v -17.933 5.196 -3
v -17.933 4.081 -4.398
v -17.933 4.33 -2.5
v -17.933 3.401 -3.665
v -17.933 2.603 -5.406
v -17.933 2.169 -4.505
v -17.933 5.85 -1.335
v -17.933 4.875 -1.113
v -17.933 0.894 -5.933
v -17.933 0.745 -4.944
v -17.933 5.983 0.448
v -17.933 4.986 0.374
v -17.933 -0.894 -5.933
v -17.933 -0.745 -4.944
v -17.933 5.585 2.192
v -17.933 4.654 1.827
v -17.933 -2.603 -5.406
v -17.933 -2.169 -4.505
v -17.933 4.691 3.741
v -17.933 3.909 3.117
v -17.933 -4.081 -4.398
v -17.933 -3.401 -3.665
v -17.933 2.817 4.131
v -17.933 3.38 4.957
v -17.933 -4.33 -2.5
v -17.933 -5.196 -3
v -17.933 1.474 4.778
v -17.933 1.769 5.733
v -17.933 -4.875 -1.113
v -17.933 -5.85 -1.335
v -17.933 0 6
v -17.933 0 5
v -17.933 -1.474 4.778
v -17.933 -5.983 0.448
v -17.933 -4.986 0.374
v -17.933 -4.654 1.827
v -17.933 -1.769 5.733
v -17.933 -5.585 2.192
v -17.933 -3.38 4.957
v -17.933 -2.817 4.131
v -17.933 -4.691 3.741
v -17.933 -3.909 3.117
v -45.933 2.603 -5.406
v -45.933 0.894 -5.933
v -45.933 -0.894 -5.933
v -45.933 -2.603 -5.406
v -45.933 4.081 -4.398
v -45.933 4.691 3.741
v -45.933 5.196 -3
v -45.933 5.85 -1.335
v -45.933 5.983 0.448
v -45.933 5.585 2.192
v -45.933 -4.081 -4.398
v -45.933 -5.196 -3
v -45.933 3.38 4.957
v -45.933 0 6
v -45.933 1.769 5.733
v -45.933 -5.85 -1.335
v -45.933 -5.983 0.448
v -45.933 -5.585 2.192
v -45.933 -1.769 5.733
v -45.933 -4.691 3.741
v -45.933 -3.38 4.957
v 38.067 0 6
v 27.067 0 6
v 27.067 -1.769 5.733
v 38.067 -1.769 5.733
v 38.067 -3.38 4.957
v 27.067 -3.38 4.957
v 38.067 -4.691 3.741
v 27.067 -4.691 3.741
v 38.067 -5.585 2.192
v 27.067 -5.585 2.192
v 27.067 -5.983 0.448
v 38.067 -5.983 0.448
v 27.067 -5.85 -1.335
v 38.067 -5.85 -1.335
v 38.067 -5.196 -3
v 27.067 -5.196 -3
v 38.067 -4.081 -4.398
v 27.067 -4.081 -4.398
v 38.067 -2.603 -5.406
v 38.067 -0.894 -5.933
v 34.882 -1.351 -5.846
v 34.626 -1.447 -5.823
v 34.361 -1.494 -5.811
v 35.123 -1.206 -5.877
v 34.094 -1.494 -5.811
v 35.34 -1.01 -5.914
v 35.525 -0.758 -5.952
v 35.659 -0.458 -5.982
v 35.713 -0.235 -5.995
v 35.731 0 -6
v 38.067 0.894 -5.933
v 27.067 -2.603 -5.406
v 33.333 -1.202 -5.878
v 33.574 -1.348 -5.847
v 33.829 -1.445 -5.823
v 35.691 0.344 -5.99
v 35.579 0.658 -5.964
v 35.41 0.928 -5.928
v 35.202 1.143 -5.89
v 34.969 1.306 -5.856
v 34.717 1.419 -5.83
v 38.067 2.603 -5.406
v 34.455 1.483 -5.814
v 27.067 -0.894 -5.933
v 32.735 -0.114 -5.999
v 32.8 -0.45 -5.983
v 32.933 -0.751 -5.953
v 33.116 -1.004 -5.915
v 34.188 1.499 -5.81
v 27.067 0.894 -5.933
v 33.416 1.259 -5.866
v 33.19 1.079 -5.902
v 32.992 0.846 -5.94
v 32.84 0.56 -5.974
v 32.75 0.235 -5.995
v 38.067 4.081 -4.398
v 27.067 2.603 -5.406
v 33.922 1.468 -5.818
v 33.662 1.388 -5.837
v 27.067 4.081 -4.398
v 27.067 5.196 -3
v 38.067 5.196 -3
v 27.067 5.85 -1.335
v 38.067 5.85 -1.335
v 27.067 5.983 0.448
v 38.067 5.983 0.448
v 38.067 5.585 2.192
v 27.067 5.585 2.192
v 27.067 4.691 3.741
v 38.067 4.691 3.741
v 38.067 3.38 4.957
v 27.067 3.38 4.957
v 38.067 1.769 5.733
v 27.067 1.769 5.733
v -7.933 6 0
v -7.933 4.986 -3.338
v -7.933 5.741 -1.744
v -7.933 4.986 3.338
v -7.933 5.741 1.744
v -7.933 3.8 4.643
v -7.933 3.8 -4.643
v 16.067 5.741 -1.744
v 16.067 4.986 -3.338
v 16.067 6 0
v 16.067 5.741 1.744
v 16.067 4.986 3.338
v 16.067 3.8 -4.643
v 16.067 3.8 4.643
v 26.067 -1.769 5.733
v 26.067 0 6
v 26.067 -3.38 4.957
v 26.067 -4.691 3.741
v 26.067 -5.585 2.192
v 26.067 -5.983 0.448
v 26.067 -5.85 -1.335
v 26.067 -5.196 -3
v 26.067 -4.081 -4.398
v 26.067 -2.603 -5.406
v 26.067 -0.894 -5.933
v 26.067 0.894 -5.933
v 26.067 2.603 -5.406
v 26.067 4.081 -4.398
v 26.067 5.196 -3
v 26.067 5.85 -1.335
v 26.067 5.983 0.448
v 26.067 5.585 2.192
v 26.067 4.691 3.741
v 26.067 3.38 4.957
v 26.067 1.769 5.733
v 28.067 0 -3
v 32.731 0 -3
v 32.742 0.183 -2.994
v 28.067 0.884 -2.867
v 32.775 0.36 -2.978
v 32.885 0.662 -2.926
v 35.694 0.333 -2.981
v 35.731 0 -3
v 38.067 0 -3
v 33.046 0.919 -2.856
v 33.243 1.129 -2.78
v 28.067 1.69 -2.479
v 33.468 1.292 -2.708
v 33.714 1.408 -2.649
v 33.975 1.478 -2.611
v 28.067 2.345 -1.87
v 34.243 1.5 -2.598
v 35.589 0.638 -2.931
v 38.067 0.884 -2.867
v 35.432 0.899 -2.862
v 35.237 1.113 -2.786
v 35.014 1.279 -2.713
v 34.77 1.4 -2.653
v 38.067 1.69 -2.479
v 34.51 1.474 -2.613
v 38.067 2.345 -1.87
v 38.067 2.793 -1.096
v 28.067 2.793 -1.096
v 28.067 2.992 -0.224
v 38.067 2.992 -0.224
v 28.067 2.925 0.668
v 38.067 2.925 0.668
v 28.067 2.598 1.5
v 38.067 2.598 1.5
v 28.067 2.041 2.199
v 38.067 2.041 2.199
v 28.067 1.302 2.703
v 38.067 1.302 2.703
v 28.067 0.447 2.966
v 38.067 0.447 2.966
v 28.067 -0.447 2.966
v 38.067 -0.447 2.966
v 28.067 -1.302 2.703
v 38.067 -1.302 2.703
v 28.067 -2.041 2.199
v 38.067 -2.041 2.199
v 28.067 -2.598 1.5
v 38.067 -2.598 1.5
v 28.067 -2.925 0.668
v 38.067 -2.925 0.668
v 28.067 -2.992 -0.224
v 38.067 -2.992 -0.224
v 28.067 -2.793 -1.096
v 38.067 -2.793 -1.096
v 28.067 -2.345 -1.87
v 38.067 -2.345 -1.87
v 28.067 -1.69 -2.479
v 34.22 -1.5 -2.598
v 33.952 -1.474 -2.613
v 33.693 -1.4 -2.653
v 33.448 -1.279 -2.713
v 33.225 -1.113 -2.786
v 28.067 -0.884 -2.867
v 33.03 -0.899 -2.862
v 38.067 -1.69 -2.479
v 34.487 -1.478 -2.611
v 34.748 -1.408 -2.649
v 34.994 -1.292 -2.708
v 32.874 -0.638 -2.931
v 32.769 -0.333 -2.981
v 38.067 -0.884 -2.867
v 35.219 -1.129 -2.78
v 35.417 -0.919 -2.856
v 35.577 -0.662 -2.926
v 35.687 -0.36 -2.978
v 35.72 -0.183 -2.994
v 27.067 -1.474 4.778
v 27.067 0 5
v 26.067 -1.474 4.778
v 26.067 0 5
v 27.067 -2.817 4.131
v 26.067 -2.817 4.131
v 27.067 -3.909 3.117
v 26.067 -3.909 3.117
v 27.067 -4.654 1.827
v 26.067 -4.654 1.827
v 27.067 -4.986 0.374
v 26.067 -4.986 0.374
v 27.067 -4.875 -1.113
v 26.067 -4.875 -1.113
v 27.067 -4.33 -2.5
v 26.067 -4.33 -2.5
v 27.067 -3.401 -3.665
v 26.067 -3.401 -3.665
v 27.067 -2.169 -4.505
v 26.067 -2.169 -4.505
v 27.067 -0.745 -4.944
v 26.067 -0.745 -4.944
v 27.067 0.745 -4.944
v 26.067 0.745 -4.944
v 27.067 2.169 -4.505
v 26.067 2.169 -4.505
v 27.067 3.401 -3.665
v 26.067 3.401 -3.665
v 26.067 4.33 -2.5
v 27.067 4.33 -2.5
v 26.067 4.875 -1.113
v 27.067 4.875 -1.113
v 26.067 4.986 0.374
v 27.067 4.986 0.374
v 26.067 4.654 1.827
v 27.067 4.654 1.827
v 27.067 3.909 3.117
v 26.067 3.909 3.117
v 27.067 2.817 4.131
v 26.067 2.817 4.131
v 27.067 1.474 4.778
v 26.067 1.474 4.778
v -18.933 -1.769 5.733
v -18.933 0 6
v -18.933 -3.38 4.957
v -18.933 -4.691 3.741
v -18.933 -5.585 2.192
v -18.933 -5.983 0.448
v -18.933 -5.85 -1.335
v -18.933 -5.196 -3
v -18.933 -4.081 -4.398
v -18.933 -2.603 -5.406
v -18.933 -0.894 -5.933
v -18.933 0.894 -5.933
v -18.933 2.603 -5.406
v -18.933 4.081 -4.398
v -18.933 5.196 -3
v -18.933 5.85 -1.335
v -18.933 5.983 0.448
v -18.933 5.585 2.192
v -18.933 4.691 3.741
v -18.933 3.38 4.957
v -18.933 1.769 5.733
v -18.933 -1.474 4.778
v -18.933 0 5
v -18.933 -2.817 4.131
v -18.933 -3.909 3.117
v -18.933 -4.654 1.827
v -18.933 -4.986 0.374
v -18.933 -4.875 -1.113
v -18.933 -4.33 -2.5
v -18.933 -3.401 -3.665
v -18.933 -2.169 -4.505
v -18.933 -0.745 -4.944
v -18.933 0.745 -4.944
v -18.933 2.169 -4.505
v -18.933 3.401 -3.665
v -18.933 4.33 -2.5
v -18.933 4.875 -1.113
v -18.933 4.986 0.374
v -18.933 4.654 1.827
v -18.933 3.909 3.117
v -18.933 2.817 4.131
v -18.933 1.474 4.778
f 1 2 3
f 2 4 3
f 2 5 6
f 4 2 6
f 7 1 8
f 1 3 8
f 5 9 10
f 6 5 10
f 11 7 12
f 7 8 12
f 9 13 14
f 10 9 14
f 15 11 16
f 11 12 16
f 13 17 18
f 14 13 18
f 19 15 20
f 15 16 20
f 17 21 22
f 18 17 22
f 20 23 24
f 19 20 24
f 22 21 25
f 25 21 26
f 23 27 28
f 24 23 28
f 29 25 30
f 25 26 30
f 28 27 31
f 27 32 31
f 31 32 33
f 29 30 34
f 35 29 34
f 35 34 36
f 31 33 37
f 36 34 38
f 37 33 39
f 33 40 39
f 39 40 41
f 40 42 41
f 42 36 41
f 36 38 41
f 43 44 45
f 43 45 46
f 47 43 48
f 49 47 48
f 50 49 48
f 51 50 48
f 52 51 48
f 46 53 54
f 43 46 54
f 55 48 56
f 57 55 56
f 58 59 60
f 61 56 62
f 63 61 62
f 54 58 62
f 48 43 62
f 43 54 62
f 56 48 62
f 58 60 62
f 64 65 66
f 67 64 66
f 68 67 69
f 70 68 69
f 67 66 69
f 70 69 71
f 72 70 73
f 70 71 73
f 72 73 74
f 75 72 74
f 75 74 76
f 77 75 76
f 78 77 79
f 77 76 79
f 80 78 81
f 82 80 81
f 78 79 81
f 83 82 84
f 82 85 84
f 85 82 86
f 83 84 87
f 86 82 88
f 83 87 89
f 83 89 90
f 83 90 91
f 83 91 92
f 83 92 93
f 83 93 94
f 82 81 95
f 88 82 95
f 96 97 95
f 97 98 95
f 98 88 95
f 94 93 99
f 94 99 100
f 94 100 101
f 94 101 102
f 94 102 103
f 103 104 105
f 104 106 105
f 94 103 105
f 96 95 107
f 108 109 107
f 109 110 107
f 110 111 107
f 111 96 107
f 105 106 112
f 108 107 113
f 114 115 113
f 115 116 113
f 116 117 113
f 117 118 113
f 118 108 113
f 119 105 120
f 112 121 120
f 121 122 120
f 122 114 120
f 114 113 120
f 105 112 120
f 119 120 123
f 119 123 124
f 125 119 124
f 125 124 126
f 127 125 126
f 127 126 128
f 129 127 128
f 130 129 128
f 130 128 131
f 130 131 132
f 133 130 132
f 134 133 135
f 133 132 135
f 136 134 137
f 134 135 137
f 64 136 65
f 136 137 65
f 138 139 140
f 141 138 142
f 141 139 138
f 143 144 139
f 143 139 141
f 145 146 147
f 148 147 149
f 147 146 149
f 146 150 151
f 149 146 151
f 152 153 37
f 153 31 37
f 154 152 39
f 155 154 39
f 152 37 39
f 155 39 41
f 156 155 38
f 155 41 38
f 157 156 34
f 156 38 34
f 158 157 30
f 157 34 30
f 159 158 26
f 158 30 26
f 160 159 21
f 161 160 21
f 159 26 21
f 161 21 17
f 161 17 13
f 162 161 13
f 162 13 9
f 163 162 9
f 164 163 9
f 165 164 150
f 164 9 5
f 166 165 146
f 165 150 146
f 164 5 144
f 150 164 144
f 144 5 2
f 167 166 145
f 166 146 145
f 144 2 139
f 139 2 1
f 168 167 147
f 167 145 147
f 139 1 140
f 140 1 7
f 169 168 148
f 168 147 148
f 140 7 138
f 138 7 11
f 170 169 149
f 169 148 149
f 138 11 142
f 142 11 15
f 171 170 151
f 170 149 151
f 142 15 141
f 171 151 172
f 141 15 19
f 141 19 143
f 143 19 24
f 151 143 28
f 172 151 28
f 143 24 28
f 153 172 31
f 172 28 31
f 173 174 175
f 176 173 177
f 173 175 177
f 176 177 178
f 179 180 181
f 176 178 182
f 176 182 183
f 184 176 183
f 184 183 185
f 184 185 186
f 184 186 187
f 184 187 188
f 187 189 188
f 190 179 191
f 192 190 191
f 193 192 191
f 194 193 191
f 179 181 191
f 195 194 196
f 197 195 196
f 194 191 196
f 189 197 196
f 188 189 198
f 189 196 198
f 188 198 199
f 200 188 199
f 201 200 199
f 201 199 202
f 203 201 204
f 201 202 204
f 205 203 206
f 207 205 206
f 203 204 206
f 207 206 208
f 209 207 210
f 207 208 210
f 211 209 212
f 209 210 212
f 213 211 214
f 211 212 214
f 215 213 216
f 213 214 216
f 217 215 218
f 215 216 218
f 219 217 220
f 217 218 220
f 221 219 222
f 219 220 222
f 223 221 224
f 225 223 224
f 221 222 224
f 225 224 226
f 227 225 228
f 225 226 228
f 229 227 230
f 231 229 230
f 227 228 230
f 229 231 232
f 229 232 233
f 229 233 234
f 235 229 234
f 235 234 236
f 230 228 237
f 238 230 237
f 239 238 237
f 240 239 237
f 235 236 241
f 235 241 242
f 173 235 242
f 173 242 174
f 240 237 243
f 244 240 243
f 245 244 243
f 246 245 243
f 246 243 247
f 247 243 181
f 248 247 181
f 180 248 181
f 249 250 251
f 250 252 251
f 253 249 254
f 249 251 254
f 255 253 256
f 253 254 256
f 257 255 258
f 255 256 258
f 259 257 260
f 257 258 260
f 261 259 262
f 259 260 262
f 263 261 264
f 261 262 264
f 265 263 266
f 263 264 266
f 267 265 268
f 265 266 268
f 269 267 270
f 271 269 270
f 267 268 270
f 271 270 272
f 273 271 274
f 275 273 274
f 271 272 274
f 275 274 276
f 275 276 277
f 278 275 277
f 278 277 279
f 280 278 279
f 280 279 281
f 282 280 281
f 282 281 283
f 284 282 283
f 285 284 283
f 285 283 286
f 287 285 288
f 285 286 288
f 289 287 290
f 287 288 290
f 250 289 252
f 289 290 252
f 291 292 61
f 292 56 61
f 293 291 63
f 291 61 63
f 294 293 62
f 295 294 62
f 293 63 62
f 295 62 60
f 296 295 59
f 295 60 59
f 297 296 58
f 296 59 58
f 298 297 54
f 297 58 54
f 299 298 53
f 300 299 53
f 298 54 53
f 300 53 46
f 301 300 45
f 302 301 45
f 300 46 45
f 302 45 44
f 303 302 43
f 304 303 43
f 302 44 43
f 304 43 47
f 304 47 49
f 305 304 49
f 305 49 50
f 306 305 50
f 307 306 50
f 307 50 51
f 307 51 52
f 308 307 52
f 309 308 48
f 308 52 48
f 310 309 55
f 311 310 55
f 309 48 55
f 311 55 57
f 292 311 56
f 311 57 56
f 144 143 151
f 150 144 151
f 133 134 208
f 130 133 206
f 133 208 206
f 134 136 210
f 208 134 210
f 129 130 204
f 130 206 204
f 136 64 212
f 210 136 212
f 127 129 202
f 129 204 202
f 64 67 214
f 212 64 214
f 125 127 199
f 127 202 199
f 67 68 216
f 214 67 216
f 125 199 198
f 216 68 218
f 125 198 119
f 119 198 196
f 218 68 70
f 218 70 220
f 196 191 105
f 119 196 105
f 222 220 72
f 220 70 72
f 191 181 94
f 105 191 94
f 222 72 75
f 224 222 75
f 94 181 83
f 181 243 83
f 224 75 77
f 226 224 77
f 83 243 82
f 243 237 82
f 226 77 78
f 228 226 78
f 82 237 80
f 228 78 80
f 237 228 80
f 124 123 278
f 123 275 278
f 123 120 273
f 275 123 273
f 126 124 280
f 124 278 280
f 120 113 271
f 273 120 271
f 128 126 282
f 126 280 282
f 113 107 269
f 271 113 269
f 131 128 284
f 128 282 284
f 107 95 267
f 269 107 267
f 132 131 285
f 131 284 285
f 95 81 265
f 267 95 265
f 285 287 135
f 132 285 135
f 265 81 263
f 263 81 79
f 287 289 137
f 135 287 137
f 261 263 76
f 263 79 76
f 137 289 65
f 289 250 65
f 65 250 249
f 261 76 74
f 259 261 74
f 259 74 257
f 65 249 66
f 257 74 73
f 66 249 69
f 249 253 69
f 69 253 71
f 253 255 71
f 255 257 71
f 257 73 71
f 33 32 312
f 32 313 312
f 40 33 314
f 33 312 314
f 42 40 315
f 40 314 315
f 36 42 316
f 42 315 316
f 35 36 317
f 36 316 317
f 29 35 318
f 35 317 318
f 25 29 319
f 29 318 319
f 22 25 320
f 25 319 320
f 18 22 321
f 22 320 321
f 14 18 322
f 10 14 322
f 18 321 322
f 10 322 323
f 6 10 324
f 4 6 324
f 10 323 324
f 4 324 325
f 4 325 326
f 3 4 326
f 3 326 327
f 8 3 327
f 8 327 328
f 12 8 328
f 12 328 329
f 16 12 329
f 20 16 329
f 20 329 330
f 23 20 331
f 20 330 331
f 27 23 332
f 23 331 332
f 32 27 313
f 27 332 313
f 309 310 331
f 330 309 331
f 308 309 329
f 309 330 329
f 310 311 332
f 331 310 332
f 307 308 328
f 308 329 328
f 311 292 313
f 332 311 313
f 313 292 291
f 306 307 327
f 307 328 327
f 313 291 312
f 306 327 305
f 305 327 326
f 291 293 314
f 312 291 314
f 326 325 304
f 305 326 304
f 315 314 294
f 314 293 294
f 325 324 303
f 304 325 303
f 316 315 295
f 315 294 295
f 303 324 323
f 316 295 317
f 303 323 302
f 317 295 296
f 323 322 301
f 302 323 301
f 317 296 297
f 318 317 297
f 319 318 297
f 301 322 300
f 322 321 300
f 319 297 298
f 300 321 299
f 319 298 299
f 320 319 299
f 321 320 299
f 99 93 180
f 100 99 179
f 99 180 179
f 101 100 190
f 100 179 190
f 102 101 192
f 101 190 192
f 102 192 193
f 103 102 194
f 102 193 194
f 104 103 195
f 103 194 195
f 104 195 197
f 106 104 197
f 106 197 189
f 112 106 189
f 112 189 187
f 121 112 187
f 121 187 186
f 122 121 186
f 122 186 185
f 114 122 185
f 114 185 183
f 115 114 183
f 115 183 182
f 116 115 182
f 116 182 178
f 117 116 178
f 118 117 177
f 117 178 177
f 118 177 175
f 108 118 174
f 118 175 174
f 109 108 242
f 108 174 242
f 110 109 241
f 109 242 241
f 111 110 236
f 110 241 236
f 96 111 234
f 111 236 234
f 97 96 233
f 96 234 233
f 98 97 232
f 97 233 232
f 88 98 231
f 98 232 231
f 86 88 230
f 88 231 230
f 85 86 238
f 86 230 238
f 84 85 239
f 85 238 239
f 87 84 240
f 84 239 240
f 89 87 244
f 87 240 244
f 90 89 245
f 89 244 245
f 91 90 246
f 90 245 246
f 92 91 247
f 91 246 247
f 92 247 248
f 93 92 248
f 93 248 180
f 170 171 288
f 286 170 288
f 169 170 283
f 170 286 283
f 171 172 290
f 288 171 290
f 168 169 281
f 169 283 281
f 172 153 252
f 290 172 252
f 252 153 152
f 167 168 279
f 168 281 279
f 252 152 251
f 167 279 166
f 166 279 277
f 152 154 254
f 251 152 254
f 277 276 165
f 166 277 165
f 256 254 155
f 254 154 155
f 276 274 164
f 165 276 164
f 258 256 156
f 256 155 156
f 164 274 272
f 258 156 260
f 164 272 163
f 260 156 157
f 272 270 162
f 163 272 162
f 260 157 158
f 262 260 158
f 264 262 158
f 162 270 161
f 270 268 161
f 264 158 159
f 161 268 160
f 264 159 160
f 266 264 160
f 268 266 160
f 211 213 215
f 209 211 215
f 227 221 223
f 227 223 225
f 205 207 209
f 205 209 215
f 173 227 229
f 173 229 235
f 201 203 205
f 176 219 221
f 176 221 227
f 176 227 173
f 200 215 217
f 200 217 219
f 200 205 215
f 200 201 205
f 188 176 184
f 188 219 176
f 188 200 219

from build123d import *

# Parameters (mm, degrees)
SKETCH2_R          = 3
CUT_EXTRUDE1_DEPTH = 10
SKETCH3_R          = 1.5
CUT_EXTRUDE2_DEPTH = 10
CUT_EXTRUDE3_DEPTH = 2.2
SKETCH6_W          = 24
SKETCH6_H          = 3.713708499
CUT_EXTRUDE4_DEPTH = 8


with BuildPart() as part:
    # Sketch1 → Revolve1 (revolve)
    with BuildSketch(Plane.XY, mode=Mode.PRIVATE) as revolve1_sk:
        Polygon((-45.933362566, 0), (38.066637434, 0), (38.066637434, 6), (27.066637434, 6), (27.066637434, 5), (26.066637434, 5), (26.066637434, 6), (-17.933362566, 6), (-17.933362566, 5), (-18.933362566, 5), (-18.933362566, 6), (-45.933362566, 6), align=None)
    revolve(revolve1_sk.sketch.rotate(Axis((-45.933362566, 0, 0), (1, 0, 0)), 90), axis=Axis((-45.933362566, 0, 0), (1, 0, 0)))

    # Sketch2 → Cut-Extrude1 (cut)
    with BuildSketch(Plane(origin=(38.066637434, 0, 0), x_dir=(0, 0, -1), z_dir=(1, 0, 0))):
        Circle(SKETCH2_R)
    extrude(amount=-CUT_EXTRUDE1_DEPTH, mode=Mode.SUBTRACT)

    # Sketch3 → Cut-Extrude2 (cut)
    with BuildSketch(Plane.XY):
        with Locations((34.231149576, 0)):
            Circle(SKETCH3_R)
    extrude(amount=-CUT_EXTRUDE2_DEPTH, mode=Mode.SUBTRACT)

    # Sketch5 → Cut-Extrude3 (cut)
    with BuildSketch(Plane(origin=(0, 6, 0), x_dir=(1, 0, 0), z_dir=(0, 1, 0))):
        with BuildLine():
            Line((-5.933362566, 2), (14.066637434, 2))
            ThreePointArc((14.066637434, 2), (16.066637434, 0), (14.066637434, -2))
            Line((14.066637434, -2), (-5.933362566, -2))
            ThreePointArc((-5.933362566, -2), (-7.933362566, 0), (-5.933362566, 2))
        make_face()
    extrude(amount=-CUT_EXTRUDE3_DEPTH, mode=Mode.SUBTRACT)

    # Sketch6 → Cut-Extrude4 (cut, symmetric)
    with BuildSketch(Plane.XY):
        with Locations((4.066637434, 5.65685425)):
            Rectangle(SKETCH6_W, SKETCH6_H)
    extrude(amount=CUT_EXTRUDE4_DEPTH, both=True, mode=Mode.SUBTRACT)


solid = part.part
